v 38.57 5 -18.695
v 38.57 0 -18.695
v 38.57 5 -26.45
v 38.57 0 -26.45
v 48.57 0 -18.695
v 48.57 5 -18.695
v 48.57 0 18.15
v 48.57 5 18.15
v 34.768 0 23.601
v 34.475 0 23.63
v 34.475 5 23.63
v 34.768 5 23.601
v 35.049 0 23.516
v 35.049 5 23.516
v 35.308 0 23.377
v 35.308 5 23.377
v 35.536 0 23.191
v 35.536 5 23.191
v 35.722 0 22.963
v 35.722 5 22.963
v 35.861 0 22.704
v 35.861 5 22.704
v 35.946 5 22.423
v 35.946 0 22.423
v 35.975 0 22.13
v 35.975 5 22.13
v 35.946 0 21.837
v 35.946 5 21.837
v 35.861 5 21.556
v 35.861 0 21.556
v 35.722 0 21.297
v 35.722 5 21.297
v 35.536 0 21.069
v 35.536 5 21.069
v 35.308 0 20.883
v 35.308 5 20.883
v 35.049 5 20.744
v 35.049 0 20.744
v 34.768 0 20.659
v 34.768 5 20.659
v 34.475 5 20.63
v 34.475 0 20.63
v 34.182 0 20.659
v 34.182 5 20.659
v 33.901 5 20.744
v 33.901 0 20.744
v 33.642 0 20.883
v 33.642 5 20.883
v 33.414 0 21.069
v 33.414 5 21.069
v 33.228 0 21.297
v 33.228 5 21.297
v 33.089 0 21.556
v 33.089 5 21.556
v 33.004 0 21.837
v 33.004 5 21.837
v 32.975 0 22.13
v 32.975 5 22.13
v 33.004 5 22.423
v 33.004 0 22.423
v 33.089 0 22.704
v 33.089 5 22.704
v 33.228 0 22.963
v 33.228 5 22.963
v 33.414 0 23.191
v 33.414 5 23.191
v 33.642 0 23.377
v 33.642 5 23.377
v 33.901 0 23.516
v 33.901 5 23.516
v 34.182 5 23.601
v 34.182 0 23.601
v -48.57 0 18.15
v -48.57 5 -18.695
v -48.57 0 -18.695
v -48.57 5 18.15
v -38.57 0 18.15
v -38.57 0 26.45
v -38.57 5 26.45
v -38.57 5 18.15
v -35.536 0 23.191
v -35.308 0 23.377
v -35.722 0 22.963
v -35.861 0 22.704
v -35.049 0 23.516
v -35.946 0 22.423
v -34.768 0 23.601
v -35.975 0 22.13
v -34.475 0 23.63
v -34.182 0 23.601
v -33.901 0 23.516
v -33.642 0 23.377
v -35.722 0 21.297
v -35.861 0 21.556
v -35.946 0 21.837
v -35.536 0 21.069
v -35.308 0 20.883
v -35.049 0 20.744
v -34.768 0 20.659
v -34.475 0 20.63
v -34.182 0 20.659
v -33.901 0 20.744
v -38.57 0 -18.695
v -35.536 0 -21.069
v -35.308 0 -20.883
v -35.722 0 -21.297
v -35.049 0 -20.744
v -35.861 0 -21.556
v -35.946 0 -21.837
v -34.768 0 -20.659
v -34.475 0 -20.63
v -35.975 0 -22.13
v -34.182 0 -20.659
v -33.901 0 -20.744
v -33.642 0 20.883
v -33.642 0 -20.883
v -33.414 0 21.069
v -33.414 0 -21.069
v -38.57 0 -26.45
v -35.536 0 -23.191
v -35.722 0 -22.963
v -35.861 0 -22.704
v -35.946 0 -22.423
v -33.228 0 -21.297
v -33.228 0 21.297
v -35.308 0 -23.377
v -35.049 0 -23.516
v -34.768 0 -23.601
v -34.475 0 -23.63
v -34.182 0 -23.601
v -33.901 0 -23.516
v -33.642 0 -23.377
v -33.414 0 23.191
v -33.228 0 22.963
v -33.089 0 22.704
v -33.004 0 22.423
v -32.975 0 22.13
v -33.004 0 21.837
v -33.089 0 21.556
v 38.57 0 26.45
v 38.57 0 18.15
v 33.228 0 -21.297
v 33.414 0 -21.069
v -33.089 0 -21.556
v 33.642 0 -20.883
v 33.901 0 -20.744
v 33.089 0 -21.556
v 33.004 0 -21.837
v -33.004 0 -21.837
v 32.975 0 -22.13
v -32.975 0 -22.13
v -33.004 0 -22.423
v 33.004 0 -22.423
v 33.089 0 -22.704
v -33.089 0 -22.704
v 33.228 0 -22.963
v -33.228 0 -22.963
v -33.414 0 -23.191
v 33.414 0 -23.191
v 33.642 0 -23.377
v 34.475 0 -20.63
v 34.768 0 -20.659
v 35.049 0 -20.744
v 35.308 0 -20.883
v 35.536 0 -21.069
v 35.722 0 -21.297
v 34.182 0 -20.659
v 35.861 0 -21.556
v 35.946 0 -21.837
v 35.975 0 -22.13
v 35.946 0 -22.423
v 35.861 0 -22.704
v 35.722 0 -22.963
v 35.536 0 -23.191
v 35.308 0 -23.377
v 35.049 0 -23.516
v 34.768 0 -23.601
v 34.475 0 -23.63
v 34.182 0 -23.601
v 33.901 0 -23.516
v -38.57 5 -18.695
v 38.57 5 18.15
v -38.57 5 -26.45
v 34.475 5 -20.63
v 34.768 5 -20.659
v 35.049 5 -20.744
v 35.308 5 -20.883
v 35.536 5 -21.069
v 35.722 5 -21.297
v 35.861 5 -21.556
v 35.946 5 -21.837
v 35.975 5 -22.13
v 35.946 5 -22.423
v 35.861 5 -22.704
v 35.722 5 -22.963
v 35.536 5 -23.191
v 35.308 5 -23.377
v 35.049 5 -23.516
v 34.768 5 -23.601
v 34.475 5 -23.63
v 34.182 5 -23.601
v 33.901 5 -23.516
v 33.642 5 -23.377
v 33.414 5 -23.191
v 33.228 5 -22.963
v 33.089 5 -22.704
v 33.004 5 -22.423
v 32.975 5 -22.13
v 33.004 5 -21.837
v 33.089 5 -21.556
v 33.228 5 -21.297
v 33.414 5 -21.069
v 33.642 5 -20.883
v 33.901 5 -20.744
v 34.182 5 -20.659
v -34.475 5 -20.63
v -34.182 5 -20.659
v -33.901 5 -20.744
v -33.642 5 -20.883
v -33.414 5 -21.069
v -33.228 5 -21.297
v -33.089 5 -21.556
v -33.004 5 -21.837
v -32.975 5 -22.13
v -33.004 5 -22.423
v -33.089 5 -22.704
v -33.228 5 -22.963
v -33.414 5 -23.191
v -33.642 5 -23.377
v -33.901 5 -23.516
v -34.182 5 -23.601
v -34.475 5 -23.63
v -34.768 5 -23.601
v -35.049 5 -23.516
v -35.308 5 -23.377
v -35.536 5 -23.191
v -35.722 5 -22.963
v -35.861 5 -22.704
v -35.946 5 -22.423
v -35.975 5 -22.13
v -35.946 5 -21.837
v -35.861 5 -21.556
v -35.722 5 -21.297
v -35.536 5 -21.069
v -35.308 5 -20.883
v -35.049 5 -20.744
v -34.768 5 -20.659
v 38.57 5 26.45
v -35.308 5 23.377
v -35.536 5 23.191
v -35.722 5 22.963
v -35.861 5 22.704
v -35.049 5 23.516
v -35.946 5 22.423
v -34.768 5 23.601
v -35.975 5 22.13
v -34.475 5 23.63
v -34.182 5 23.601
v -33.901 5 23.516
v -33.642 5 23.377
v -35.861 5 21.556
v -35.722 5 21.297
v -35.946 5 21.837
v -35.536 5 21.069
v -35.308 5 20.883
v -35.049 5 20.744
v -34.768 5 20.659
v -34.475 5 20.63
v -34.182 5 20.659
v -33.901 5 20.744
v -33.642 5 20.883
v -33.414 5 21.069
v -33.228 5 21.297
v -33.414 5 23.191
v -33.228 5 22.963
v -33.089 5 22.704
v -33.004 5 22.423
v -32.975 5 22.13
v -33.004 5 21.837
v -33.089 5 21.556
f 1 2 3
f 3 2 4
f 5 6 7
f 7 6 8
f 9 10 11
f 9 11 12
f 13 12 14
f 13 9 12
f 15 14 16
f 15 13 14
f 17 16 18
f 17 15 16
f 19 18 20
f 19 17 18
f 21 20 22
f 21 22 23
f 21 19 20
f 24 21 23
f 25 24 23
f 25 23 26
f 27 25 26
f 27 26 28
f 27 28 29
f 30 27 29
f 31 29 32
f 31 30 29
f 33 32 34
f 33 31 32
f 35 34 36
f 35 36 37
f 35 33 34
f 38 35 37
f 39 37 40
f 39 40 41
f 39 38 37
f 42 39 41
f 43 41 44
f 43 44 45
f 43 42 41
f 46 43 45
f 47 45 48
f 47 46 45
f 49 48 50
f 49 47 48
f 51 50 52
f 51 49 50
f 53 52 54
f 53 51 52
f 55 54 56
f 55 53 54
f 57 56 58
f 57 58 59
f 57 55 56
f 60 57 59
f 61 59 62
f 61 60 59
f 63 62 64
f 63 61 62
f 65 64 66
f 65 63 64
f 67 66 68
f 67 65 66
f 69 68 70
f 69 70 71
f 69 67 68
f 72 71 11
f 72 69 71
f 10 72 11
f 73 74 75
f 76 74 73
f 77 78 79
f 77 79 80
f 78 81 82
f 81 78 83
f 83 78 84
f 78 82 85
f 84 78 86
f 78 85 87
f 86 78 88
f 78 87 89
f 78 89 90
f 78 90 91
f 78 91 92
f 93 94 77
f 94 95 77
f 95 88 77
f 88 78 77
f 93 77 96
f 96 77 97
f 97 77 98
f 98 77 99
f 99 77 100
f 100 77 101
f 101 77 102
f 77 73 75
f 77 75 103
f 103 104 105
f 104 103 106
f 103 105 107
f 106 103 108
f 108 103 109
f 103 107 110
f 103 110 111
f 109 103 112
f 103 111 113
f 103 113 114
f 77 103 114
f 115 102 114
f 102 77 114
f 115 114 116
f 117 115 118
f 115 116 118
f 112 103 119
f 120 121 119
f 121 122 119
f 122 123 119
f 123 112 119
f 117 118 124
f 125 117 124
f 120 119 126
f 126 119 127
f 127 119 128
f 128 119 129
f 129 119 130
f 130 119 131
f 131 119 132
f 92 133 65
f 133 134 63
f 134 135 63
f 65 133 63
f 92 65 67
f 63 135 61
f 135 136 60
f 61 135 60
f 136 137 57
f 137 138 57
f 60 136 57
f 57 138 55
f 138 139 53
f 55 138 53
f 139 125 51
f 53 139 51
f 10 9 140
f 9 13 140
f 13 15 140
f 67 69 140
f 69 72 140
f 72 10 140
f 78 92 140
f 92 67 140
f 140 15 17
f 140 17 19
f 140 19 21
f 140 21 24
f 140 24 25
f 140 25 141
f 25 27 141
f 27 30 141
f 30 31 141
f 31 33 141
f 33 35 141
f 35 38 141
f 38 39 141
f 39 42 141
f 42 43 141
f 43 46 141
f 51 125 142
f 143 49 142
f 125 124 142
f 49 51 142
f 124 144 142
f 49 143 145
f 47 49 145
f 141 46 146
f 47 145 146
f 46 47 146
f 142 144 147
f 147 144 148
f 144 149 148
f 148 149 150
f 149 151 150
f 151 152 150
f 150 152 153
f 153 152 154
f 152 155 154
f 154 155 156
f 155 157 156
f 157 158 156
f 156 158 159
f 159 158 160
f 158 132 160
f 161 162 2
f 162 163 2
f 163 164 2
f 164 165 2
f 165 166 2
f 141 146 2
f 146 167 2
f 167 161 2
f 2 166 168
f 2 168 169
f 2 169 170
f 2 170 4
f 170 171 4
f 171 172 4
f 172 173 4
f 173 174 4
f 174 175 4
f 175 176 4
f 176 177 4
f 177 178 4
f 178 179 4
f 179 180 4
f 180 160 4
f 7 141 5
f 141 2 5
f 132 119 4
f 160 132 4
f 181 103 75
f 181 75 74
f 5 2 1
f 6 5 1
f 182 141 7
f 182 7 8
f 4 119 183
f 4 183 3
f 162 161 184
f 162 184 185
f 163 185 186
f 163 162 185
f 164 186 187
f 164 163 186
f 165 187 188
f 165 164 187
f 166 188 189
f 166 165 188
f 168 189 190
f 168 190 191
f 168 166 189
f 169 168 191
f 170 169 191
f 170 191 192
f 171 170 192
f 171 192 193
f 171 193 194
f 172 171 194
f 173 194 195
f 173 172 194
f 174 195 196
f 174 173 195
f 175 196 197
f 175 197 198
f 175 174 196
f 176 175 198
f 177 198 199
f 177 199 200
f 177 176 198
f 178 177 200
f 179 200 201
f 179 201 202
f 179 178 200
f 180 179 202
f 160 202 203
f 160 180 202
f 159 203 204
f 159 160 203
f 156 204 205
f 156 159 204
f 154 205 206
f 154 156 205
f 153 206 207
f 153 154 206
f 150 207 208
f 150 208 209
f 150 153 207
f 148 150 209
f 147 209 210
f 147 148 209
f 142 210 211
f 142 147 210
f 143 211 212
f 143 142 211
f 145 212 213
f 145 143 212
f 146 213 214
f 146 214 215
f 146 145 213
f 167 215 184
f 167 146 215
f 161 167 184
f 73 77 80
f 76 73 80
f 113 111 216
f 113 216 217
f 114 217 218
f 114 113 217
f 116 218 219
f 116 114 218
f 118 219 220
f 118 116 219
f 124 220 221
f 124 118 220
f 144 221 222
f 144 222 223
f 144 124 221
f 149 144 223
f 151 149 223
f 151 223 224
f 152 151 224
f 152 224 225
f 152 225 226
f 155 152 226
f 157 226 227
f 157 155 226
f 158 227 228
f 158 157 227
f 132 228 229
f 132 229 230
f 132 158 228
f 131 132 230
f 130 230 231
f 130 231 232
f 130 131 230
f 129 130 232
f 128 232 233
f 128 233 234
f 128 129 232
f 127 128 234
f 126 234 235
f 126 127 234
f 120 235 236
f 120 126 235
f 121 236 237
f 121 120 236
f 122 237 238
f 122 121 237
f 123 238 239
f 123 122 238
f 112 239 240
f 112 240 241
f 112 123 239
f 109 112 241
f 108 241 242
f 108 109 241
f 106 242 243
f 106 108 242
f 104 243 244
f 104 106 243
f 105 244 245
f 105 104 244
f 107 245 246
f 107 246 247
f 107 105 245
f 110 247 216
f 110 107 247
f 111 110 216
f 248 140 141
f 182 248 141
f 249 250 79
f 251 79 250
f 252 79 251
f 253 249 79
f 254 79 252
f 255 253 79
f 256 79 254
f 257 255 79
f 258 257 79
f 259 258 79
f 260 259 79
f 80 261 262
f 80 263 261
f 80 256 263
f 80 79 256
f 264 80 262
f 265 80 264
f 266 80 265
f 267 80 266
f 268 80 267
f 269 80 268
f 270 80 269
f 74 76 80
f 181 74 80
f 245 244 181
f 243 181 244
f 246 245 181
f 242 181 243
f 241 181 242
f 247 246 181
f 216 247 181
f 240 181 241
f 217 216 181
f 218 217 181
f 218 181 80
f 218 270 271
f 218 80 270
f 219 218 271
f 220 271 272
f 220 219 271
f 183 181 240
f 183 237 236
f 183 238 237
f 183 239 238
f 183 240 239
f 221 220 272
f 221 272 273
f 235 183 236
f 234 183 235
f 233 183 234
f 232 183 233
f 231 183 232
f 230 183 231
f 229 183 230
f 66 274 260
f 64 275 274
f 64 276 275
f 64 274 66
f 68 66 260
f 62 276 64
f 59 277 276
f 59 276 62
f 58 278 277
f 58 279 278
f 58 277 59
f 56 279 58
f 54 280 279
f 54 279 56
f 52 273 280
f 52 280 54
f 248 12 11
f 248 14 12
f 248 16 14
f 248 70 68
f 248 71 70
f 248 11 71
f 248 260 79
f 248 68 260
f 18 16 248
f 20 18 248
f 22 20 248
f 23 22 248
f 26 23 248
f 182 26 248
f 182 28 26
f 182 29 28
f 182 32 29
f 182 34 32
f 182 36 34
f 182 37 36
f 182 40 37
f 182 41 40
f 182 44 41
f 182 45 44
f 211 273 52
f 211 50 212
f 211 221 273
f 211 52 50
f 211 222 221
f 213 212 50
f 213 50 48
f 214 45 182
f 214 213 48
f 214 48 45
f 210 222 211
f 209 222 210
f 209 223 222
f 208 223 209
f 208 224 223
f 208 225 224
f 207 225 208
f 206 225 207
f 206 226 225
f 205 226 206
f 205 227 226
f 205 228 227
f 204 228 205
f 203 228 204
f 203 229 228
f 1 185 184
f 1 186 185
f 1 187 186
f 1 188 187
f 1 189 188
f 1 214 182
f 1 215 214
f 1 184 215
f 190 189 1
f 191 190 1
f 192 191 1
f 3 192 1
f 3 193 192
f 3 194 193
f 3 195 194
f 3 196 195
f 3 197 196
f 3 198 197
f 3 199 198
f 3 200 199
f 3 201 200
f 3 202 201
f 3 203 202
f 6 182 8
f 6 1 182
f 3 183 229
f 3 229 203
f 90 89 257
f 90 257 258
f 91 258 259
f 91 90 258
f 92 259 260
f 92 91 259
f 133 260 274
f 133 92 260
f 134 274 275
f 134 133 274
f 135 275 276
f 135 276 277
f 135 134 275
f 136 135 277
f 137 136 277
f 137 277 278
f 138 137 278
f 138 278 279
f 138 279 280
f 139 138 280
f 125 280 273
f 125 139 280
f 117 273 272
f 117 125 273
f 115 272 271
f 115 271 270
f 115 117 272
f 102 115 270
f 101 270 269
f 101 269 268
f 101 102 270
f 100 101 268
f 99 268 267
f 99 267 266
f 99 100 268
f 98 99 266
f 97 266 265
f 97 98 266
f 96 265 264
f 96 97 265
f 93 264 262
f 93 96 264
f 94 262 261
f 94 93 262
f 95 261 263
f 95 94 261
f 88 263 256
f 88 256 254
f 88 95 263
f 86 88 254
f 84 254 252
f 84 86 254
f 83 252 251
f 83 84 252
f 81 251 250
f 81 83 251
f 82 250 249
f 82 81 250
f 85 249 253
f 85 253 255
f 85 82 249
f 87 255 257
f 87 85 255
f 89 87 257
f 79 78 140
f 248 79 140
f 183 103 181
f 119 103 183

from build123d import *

# Parameters (mm, degrees)
SKETCH_1_W      = 77.14
SKETCH_1_H      = 52.9
SKETCH_1_R      = 1.5
EXTRUDE_1_DEPTH = 5
SKETCH_2_W      = 36.844868946
SKETCH_2_H      = 5
EXTRUDE_2_DEPTH = 10


with BuildPart() as part:
    # 草图1 → 凸台-拉伸1 (new body)
    with BuildSketch(Plane(origin=(0, 0, 0), x_dir=(1, 0, 0), z_dir=(0, 1, 0))):
        Rectangle(SKETCH_1_W, SKETCH_1_H)
        with Locations(Location((34.475, -22.13, 0), (0, 0, 270))):
            Circle(SKETCH_1_R, mode=Mode.SUBTRACT)
        with Locations(Location((34.475, 22.13, 0), (0, 0, 270))):
            Circle(SKETCH_1_R, mode=Mode.SUBTRACT)
        with Locations(Location((-34.475, 22.13, 0), (0, 0, 270))):
            Circle(SKETCH_1_R, mode=Mode.SUBTRACT)
        with Locations(Location((-34.475, -22.13, 0), (0, 0, 270))):
            Circle(SKETCH_1_R, mode=Mode.SUBTRACT)
    extrude(amount=EXTRUDE_1_DEPTH)

    # 草图2 → 凸台-拉伸2 (add)
    with BuildSketch(Plane.ZY.offset(38.57)):
        with Locations((-0.272252726, 2.5)):
            Rectangle(SKETCH_2_W, SKETCH_2_H)
    extrude_2 = extrude(amount=EXTRUDE_2_DEPTH)

    # 镜向1: 凸台-拉伸2 across plane
    add(extrude_2.mirror(Plane(origin=(0, 0, 0), x_dir=(0, 0, 1), z_dir=(1, 0, 0))))


solid = part.part
